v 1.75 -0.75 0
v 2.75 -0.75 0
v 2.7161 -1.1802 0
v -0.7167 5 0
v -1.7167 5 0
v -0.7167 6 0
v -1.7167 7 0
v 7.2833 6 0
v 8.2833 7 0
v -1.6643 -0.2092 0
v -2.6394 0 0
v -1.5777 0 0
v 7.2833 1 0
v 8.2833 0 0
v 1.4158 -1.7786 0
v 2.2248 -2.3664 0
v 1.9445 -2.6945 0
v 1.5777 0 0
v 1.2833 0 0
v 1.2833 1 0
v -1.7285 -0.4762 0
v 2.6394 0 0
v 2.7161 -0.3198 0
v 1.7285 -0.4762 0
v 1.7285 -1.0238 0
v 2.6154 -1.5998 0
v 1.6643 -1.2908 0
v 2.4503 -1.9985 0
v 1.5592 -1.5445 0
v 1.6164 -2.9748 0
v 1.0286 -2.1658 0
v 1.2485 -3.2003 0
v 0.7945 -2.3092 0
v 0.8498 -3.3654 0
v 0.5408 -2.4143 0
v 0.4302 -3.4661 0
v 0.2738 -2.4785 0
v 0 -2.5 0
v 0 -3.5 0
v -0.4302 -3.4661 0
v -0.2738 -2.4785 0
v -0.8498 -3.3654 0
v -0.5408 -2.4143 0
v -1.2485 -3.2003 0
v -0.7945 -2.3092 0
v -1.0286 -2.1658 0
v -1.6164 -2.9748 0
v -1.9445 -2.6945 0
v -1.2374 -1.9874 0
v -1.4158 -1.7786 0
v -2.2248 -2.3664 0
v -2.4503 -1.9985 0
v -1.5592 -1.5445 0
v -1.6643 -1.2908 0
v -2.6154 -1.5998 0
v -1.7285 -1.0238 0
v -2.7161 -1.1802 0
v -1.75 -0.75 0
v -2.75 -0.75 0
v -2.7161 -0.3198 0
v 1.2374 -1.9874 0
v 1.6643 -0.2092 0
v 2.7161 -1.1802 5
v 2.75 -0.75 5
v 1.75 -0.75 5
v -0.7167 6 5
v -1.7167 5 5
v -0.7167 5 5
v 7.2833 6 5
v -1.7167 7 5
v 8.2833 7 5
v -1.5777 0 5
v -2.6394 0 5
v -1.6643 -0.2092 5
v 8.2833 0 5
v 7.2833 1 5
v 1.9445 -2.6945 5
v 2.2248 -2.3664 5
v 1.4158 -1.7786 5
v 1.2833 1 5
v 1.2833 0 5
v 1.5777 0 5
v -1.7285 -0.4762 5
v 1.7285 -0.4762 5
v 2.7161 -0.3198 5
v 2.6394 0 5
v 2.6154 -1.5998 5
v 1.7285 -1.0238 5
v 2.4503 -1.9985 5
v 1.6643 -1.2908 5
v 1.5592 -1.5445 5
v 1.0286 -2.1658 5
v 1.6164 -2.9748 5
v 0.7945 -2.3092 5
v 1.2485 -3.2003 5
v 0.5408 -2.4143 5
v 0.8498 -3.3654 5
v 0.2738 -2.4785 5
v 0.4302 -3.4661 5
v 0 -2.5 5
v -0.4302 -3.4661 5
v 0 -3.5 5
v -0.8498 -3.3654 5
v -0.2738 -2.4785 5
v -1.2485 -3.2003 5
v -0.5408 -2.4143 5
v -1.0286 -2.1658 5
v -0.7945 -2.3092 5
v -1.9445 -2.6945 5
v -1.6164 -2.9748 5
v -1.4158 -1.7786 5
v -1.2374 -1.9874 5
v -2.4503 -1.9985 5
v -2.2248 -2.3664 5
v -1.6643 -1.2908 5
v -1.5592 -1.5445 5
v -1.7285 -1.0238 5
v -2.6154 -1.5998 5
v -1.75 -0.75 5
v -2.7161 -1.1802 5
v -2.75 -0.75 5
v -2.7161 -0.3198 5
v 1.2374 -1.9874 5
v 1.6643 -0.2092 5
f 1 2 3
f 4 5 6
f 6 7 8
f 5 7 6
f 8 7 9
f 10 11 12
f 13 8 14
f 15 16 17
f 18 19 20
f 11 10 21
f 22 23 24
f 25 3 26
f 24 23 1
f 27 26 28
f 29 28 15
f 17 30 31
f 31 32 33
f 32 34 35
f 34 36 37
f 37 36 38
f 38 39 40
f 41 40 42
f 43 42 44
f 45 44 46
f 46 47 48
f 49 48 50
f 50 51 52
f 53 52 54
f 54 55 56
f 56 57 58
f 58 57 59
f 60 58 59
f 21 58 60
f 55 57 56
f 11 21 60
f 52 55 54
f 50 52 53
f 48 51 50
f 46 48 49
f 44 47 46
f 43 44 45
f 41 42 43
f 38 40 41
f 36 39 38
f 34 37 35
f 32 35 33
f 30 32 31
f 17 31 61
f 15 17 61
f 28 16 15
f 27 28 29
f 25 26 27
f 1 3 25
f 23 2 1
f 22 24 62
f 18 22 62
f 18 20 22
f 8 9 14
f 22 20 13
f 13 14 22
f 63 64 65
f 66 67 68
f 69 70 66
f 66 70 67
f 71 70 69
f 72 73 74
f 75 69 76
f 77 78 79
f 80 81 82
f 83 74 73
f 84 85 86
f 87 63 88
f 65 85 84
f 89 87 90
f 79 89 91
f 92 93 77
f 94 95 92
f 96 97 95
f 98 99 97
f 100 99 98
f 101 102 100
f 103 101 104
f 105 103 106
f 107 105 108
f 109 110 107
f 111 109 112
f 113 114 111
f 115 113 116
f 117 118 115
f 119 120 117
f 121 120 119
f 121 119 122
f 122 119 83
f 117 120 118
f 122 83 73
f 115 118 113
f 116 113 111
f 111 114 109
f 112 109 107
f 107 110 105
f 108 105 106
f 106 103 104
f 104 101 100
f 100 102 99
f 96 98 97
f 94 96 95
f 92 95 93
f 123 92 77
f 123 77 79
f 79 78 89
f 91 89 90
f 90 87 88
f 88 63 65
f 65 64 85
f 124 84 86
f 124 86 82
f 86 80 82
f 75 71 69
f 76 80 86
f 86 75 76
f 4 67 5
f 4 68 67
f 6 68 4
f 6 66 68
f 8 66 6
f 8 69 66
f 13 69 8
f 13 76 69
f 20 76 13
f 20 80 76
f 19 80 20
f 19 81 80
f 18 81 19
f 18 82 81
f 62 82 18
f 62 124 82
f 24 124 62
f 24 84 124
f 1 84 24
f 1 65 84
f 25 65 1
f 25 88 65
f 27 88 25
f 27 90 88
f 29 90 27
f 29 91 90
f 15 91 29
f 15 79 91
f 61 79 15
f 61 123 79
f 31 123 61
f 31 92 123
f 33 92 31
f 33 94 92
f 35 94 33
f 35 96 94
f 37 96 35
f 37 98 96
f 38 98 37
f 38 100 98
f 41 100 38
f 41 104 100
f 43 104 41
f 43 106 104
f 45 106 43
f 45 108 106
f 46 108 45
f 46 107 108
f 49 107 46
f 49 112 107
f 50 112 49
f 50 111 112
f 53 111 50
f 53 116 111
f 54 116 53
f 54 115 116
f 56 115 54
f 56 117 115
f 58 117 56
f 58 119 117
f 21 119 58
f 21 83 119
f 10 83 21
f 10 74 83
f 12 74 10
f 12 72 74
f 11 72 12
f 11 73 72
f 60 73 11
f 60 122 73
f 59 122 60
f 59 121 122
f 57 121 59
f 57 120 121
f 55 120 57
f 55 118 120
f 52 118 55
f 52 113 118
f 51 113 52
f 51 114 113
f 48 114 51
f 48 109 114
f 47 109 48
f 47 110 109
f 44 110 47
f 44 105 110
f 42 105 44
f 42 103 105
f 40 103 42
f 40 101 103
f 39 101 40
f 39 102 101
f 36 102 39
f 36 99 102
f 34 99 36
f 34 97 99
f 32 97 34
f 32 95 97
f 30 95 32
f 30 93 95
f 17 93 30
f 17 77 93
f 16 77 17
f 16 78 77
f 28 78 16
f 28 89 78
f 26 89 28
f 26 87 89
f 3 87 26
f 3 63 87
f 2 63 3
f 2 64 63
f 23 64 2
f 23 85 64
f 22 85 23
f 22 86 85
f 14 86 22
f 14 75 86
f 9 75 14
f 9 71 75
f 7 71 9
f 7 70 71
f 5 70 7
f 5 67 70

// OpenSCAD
//!OpenSCAD

filament_radius = 1.75;
grabber_length = 2;
spool_side_width = 5;
Height = 5;
/*[Hidden]*/
material_thickness = 1;

linear_extrude( height=Height, twist=0, scale=[1, 1], center=false){
  union(){
    translate([0, ((filament_radius - material_thickness * 1) / -1), 0]){
      difference() {
        difference() {
          {
            $fn=40;    //set sides to 40
            circle(r=(filament_radius + material_thickness));
          }

          {
            $fn=40;    //set sides to 40
            circle(r=filament_radius);
          }
        }

        translate([-50, (filament_radius - material_thickness * 1), 0]){
          square([100, 2], center=false);
        }
      }
    }
    union(){
      translate([(filament_radius - (filament_radius / 0.75) * 0.2), 0, 0]){
        square([7, material_thickness], center=false);
      }
      translate([((filament_radius - (filament_radius / 0.75) * 0.2) + 7), material_thickness, 0]){
        rotate([0, 0, 90]){
          square([spool_side_width, material_thickness], center=false);
        }
      }
      translate([((filament_radius - (filament_radius / 0.75) * 0.2) - 3), (spool_side_width + material_thickness * 1), 0]){
        square([10, material_thickness], center=false);
      }
    }
    translate([((filament_radius - (filament_radius / 0.75) * 0.2) - 3), (spool_side_width + (material_thickness - (grabber_length - material_thickness))), 0]){
      square([material_thickness, grabber_length], center=false);
    }
  }
}
